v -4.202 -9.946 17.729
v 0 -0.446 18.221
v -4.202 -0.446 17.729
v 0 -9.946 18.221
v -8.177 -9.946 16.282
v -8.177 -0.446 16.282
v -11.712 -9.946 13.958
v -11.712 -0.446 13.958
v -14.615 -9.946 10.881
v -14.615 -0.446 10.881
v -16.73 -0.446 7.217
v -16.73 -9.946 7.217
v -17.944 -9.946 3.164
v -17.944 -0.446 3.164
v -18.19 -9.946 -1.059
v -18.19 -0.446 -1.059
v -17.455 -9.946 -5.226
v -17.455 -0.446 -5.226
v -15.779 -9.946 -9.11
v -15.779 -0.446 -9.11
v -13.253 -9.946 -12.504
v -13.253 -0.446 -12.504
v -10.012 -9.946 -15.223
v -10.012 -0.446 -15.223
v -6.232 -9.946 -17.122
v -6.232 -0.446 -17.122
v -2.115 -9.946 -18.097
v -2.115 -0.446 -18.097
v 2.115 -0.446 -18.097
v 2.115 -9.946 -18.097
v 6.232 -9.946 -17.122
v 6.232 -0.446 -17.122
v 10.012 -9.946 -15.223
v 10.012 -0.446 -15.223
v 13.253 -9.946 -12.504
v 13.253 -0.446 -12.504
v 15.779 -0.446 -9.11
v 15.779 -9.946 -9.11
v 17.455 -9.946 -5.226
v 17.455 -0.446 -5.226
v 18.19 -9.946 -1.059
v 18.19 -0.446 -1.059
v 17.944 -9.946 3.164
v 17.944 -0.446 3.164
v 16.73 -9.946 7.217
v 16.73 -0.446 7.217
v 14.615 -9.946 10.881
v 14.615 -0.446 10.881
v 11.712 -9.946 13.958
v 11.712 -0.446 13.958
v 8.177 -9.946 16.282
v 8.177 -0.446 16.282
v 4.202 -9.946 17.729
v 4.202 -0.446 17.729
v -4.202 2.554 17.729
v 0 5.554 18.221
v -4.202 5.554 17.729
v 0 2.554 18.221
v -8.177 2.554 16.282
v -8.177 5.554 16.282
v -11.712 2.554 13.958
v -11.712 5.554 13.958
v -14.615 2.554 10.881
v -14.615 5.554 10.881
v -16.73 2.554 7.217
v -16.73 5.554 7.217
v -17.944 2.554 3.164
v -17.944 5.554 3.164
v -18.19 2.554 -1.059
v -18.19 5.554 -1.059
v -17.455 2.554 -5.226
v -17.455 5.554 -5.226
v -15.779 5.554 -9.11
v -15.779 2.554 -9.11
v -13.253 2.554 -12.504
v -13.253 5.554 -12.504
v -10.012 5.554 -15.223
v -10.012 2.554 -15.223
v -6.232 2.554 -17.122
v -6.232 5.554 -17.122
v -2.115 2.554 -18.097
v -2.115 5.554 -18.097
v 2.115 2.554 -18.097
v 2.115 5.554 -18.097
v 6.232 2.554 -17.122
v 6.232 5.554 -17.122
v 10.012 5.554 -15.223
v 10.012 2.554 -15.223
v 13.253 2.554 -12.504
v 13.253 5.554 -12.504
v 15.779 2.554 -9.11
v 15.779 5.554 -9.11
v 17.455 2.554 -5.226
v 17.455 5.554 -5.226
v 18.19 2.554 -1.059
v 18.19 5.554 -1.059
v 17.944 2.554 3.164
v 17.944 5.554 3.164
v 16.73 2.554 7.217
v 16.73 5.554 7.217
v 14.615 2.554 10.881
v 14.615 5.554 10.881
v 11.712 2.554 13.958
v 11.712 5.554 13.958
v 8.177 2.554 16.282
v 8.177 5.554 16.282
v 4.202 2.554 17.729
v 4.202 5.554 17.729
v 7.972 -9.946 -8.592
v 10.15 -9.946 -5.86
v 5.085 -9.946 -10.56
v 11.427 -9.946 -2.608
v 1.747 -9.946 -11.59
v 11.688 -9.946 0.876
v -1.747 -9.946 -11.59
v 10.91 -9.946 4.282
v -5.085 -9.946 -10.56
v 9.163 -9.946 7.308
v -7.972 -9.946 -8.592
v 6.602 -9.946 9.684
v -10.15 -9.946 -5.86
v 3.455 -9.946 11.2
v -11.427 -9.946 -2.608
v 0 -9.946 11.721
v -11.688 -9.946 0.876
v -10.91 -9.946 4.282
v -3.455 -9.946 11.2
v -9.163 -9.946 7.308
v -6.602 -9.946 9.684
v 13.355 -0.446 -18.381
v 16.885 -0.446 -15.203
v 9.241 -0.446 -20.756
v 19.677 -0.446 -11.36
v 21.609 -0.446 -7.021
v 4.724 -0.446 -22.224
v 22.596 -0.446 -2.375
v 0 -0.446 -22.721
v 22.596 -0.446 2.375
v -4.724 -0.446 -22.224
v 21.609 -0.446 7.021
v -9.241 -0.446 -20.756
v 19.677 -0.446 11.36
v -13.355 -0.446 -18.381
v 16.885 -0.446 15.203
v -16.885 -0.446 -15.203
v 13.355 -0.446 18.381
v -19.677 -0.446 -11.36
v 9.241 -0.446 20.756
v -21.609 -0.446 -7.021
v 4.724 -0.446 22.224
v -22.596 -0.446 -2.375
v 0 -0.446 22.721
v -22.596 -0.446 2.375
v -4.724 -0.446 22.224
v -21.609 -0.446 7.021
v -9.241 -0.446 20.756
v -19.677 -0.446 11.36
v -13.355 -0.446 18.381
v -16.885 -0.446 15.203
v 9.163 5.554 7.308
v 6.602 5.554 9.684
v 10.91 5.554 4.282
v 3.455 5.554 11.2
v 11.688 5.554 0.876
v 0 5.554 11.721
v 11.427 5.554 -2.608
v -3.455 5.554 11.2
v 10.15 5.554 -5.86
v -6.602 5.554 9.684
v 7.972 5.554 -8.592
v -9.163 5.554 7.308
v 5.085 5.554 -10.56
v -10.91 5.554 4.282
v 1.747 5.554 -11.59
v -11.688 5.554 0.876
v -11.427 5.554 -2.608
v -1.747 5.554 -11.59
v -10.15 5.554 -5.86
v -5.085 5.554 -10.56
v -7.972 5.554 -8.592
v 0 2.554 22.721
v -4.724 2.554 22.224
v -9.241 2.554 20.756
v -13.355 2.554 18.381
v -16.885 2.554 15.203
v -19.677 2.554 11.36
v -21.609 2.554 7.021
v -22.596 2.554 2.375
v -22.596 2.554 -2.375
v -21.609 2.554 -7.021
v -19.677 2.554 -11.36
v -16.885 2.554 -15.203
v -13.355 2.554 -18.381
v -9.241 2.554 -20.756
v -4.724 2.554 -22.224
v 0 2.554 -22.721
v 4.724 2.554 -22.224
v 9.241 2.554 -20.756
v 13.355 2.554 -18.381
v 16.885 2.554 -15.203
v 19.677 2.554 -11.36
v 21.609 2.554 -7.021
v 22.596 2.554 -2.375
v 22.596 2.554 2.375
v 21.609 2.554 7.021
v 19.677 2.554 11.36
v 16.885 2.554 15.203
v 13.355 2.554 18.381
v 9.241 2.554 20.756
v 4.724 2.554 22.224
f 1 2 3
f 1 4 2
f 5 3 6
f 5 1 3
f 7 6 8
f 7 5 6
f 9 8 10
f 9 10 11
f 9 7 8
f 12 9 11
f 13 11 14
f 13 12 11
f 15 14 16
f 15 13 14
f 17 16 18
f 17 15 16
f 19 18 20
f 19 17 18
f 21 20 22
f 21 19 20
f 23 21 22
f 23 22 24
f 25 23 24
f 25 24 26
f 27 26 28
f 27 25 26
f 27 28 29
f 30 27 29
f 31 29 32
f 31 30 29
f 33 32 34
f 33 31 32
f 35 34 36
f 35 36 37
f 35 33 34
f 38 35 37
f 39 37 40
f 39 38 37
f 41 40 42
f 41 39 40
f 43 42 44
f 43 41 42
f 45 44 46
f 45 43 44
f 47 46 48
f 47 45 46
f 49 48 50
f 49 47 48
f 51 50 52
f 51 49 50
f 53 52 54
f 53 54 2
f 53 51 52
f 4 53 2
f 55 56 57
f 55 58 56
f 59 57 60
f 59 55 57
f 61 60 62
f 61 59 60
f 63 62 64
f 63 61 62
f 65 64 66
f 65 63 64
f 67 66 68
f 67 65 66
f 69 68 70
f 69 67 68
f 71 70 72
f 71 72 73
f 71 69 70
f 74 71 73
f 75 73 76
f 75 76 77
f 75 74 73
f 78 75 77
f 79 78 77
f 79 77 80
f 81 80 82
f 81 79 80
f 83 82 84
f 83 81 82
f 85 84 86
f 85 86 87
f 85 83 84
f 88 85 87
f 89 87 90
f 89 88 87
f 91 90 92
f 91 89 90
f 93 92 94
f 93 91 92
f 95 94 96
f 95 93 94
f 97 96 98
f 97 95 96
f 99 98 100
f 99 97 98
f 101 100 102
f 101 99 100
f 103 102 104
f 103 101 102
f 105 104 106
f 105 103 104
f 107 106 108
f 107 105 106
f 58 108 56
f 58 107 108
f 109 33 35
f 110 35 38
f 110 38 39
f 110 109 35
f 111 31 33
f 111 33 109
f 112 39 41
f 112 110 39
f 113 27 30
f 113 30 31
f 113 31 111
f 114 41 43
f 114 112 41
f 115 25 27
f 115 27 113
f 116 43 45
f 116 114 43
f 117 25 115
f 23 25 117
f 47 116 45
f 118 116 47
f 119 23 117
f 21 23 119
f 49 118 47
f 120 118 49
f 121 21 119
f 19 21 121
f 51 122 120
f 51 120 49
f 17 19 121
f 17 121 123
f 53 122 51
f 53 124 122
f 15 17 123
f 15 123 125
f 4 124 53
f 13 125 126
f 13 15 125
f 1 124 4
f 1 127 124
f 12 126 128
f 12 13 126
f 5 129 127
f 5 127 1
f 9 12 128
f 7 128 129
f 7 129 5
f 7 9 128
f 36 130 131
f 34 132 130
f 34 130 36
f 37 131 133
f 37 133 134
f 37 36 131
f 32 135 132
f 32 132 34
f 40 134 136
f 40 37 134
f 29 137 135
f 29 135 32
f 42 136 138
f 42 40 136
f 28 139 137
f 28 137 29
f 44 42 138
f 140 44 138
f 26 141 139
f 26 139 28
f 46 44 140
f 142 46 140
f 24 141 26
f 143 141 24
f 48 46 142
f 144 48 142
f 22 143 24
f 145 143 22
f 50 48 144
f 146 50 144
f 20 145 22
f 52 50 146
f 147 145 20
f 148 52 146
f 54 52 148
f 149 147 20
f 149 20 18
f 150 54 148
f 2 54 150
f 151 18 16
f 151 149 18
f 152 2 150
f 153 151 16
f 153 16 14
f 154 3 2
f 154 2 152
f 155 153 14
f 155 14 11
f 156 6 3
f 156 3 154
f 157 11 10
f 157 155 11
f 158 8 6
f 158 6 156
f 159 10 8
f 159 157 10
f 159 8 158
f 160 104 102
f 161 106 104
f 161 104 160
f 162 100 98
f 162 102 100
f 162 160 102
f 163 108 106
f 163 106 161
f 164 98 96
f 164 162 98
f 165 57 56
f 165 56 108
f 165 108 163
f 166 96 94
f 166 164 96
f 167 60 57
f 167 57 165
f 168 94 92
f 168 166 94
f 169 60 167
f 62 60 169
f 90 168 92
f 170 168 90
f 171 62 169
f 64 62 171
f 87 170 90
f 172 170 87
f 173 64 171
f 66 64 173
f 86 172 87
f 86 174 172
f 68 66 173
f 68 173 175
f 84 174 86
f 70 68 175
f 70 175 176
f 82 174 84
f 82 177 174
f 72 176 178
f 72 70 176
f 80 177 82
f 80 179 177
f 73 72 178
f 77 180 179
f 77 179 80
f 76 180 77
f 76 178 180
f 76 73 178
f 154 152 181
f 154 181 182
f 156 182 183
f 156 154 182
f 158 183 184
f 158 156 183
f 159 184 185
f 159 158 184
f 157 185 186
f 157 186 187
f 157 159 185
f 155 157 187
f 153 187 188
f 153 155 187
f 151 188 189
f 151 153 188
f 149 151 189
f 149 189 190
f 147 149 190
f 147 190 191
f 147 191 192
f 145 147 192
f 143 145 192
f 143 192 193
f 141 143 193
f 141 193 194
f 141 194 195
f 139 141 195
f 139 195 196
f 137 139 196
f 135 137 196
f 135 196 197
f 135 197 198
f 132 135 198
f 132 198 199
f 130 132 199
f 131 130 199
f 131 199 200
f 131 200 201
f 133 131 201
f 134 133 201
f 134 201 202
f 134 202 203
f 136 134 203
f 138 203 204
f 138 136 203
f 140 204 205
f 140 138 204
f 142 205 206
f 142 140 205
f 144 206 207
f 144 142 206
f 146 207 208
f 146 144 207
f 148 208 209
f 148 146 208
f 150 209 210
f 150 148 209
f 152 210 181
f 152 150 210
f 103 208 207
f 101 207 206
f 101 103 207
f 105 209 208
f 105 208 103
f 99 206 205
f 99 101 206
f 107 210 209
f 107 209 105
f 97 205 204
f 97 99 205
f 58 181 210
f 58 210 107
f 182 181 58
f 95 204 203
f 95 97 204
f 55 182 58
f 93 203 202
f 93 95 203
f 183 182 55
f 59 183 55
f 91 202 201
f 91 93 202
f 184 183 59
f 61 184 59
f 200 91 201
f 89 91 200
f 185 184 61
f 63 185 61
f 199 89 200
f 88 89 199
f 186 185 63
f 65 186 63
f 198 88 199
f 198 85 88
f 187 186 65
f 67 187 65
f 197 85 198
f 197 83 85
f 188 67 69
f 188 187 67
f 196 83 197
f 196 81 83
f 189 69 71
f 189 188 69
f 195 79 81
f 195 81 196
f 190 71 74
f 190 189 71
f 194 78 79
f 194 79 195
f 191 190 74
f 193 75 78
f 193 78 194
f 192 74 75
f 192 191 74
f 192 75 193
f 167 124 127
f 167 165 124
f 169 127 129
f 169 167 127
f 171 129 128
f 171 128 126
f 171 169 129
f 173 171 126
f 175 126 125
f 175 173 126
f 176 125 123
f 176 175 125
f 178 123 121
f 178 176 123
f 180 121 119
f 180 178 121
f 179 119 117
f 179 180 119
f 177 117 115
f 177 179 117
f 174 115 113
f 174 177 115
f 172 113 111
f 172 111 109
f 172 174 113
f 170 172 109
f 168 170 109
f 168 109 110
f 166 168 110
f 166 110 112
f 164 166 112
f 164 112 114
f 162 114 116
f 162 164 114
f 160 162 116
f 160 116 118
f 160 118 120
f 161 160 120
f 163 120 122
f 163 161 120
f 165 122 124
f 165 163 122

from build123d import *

# Parameters (mm, degrees)
RESSALTO_EXTRUS_O4_START = 1.5
ESBO_O6_R                = 22.720525956
ESBO_O6_R_2              = 18.220525956
RESSALTO_EXTRUS_O4_DEPTH = 1.5


with BuildPart() as part:
    # Esboço3 → Revolução2 (revolve)
    with BuildSketch(Plane.XY, mode=Mode.PRIVATE) as revolu_o2_sk:
        Polygon((-18.220525956, -9.945843652), (-11.720525956, -9.945843652), (-11.720525956, 5.554156348), (-18.220525956, 5.554156348), (-18.220525956, 2.554156348), (-22.720525956, 2.554156348), (-22.720525956, 1.054156348), (-18.220525956, 1.054156348), align=None)
    revolve(revolu_o2_sk.sketch.rotate(Axis((0, 11.544029698, 0), (0, -1, 0)), 270), axis=Axis((0, 11.544029698, 0), (0, -1, 0)))

    # Esboço6 → Ressalto-extrusão4 (add)
    with BuildSketch(Plane.XZ.offset(-1.054156348).offset(RESSALTO_EXTRUS_O4_START)):
        with Locations(Location((0, 0, 0), (0, 0, 90))):
            Circle(ESBO_O6_R)
        with Locations(Location((0, 0, 0), (0, 0, 90))):
            Circle(ESBO_O6_R_2, mode=Mode.SUBTRACT)
    extrude(amount=-RESSALTO_EXTRUS_O4_DEPTH)


solid = part.part
